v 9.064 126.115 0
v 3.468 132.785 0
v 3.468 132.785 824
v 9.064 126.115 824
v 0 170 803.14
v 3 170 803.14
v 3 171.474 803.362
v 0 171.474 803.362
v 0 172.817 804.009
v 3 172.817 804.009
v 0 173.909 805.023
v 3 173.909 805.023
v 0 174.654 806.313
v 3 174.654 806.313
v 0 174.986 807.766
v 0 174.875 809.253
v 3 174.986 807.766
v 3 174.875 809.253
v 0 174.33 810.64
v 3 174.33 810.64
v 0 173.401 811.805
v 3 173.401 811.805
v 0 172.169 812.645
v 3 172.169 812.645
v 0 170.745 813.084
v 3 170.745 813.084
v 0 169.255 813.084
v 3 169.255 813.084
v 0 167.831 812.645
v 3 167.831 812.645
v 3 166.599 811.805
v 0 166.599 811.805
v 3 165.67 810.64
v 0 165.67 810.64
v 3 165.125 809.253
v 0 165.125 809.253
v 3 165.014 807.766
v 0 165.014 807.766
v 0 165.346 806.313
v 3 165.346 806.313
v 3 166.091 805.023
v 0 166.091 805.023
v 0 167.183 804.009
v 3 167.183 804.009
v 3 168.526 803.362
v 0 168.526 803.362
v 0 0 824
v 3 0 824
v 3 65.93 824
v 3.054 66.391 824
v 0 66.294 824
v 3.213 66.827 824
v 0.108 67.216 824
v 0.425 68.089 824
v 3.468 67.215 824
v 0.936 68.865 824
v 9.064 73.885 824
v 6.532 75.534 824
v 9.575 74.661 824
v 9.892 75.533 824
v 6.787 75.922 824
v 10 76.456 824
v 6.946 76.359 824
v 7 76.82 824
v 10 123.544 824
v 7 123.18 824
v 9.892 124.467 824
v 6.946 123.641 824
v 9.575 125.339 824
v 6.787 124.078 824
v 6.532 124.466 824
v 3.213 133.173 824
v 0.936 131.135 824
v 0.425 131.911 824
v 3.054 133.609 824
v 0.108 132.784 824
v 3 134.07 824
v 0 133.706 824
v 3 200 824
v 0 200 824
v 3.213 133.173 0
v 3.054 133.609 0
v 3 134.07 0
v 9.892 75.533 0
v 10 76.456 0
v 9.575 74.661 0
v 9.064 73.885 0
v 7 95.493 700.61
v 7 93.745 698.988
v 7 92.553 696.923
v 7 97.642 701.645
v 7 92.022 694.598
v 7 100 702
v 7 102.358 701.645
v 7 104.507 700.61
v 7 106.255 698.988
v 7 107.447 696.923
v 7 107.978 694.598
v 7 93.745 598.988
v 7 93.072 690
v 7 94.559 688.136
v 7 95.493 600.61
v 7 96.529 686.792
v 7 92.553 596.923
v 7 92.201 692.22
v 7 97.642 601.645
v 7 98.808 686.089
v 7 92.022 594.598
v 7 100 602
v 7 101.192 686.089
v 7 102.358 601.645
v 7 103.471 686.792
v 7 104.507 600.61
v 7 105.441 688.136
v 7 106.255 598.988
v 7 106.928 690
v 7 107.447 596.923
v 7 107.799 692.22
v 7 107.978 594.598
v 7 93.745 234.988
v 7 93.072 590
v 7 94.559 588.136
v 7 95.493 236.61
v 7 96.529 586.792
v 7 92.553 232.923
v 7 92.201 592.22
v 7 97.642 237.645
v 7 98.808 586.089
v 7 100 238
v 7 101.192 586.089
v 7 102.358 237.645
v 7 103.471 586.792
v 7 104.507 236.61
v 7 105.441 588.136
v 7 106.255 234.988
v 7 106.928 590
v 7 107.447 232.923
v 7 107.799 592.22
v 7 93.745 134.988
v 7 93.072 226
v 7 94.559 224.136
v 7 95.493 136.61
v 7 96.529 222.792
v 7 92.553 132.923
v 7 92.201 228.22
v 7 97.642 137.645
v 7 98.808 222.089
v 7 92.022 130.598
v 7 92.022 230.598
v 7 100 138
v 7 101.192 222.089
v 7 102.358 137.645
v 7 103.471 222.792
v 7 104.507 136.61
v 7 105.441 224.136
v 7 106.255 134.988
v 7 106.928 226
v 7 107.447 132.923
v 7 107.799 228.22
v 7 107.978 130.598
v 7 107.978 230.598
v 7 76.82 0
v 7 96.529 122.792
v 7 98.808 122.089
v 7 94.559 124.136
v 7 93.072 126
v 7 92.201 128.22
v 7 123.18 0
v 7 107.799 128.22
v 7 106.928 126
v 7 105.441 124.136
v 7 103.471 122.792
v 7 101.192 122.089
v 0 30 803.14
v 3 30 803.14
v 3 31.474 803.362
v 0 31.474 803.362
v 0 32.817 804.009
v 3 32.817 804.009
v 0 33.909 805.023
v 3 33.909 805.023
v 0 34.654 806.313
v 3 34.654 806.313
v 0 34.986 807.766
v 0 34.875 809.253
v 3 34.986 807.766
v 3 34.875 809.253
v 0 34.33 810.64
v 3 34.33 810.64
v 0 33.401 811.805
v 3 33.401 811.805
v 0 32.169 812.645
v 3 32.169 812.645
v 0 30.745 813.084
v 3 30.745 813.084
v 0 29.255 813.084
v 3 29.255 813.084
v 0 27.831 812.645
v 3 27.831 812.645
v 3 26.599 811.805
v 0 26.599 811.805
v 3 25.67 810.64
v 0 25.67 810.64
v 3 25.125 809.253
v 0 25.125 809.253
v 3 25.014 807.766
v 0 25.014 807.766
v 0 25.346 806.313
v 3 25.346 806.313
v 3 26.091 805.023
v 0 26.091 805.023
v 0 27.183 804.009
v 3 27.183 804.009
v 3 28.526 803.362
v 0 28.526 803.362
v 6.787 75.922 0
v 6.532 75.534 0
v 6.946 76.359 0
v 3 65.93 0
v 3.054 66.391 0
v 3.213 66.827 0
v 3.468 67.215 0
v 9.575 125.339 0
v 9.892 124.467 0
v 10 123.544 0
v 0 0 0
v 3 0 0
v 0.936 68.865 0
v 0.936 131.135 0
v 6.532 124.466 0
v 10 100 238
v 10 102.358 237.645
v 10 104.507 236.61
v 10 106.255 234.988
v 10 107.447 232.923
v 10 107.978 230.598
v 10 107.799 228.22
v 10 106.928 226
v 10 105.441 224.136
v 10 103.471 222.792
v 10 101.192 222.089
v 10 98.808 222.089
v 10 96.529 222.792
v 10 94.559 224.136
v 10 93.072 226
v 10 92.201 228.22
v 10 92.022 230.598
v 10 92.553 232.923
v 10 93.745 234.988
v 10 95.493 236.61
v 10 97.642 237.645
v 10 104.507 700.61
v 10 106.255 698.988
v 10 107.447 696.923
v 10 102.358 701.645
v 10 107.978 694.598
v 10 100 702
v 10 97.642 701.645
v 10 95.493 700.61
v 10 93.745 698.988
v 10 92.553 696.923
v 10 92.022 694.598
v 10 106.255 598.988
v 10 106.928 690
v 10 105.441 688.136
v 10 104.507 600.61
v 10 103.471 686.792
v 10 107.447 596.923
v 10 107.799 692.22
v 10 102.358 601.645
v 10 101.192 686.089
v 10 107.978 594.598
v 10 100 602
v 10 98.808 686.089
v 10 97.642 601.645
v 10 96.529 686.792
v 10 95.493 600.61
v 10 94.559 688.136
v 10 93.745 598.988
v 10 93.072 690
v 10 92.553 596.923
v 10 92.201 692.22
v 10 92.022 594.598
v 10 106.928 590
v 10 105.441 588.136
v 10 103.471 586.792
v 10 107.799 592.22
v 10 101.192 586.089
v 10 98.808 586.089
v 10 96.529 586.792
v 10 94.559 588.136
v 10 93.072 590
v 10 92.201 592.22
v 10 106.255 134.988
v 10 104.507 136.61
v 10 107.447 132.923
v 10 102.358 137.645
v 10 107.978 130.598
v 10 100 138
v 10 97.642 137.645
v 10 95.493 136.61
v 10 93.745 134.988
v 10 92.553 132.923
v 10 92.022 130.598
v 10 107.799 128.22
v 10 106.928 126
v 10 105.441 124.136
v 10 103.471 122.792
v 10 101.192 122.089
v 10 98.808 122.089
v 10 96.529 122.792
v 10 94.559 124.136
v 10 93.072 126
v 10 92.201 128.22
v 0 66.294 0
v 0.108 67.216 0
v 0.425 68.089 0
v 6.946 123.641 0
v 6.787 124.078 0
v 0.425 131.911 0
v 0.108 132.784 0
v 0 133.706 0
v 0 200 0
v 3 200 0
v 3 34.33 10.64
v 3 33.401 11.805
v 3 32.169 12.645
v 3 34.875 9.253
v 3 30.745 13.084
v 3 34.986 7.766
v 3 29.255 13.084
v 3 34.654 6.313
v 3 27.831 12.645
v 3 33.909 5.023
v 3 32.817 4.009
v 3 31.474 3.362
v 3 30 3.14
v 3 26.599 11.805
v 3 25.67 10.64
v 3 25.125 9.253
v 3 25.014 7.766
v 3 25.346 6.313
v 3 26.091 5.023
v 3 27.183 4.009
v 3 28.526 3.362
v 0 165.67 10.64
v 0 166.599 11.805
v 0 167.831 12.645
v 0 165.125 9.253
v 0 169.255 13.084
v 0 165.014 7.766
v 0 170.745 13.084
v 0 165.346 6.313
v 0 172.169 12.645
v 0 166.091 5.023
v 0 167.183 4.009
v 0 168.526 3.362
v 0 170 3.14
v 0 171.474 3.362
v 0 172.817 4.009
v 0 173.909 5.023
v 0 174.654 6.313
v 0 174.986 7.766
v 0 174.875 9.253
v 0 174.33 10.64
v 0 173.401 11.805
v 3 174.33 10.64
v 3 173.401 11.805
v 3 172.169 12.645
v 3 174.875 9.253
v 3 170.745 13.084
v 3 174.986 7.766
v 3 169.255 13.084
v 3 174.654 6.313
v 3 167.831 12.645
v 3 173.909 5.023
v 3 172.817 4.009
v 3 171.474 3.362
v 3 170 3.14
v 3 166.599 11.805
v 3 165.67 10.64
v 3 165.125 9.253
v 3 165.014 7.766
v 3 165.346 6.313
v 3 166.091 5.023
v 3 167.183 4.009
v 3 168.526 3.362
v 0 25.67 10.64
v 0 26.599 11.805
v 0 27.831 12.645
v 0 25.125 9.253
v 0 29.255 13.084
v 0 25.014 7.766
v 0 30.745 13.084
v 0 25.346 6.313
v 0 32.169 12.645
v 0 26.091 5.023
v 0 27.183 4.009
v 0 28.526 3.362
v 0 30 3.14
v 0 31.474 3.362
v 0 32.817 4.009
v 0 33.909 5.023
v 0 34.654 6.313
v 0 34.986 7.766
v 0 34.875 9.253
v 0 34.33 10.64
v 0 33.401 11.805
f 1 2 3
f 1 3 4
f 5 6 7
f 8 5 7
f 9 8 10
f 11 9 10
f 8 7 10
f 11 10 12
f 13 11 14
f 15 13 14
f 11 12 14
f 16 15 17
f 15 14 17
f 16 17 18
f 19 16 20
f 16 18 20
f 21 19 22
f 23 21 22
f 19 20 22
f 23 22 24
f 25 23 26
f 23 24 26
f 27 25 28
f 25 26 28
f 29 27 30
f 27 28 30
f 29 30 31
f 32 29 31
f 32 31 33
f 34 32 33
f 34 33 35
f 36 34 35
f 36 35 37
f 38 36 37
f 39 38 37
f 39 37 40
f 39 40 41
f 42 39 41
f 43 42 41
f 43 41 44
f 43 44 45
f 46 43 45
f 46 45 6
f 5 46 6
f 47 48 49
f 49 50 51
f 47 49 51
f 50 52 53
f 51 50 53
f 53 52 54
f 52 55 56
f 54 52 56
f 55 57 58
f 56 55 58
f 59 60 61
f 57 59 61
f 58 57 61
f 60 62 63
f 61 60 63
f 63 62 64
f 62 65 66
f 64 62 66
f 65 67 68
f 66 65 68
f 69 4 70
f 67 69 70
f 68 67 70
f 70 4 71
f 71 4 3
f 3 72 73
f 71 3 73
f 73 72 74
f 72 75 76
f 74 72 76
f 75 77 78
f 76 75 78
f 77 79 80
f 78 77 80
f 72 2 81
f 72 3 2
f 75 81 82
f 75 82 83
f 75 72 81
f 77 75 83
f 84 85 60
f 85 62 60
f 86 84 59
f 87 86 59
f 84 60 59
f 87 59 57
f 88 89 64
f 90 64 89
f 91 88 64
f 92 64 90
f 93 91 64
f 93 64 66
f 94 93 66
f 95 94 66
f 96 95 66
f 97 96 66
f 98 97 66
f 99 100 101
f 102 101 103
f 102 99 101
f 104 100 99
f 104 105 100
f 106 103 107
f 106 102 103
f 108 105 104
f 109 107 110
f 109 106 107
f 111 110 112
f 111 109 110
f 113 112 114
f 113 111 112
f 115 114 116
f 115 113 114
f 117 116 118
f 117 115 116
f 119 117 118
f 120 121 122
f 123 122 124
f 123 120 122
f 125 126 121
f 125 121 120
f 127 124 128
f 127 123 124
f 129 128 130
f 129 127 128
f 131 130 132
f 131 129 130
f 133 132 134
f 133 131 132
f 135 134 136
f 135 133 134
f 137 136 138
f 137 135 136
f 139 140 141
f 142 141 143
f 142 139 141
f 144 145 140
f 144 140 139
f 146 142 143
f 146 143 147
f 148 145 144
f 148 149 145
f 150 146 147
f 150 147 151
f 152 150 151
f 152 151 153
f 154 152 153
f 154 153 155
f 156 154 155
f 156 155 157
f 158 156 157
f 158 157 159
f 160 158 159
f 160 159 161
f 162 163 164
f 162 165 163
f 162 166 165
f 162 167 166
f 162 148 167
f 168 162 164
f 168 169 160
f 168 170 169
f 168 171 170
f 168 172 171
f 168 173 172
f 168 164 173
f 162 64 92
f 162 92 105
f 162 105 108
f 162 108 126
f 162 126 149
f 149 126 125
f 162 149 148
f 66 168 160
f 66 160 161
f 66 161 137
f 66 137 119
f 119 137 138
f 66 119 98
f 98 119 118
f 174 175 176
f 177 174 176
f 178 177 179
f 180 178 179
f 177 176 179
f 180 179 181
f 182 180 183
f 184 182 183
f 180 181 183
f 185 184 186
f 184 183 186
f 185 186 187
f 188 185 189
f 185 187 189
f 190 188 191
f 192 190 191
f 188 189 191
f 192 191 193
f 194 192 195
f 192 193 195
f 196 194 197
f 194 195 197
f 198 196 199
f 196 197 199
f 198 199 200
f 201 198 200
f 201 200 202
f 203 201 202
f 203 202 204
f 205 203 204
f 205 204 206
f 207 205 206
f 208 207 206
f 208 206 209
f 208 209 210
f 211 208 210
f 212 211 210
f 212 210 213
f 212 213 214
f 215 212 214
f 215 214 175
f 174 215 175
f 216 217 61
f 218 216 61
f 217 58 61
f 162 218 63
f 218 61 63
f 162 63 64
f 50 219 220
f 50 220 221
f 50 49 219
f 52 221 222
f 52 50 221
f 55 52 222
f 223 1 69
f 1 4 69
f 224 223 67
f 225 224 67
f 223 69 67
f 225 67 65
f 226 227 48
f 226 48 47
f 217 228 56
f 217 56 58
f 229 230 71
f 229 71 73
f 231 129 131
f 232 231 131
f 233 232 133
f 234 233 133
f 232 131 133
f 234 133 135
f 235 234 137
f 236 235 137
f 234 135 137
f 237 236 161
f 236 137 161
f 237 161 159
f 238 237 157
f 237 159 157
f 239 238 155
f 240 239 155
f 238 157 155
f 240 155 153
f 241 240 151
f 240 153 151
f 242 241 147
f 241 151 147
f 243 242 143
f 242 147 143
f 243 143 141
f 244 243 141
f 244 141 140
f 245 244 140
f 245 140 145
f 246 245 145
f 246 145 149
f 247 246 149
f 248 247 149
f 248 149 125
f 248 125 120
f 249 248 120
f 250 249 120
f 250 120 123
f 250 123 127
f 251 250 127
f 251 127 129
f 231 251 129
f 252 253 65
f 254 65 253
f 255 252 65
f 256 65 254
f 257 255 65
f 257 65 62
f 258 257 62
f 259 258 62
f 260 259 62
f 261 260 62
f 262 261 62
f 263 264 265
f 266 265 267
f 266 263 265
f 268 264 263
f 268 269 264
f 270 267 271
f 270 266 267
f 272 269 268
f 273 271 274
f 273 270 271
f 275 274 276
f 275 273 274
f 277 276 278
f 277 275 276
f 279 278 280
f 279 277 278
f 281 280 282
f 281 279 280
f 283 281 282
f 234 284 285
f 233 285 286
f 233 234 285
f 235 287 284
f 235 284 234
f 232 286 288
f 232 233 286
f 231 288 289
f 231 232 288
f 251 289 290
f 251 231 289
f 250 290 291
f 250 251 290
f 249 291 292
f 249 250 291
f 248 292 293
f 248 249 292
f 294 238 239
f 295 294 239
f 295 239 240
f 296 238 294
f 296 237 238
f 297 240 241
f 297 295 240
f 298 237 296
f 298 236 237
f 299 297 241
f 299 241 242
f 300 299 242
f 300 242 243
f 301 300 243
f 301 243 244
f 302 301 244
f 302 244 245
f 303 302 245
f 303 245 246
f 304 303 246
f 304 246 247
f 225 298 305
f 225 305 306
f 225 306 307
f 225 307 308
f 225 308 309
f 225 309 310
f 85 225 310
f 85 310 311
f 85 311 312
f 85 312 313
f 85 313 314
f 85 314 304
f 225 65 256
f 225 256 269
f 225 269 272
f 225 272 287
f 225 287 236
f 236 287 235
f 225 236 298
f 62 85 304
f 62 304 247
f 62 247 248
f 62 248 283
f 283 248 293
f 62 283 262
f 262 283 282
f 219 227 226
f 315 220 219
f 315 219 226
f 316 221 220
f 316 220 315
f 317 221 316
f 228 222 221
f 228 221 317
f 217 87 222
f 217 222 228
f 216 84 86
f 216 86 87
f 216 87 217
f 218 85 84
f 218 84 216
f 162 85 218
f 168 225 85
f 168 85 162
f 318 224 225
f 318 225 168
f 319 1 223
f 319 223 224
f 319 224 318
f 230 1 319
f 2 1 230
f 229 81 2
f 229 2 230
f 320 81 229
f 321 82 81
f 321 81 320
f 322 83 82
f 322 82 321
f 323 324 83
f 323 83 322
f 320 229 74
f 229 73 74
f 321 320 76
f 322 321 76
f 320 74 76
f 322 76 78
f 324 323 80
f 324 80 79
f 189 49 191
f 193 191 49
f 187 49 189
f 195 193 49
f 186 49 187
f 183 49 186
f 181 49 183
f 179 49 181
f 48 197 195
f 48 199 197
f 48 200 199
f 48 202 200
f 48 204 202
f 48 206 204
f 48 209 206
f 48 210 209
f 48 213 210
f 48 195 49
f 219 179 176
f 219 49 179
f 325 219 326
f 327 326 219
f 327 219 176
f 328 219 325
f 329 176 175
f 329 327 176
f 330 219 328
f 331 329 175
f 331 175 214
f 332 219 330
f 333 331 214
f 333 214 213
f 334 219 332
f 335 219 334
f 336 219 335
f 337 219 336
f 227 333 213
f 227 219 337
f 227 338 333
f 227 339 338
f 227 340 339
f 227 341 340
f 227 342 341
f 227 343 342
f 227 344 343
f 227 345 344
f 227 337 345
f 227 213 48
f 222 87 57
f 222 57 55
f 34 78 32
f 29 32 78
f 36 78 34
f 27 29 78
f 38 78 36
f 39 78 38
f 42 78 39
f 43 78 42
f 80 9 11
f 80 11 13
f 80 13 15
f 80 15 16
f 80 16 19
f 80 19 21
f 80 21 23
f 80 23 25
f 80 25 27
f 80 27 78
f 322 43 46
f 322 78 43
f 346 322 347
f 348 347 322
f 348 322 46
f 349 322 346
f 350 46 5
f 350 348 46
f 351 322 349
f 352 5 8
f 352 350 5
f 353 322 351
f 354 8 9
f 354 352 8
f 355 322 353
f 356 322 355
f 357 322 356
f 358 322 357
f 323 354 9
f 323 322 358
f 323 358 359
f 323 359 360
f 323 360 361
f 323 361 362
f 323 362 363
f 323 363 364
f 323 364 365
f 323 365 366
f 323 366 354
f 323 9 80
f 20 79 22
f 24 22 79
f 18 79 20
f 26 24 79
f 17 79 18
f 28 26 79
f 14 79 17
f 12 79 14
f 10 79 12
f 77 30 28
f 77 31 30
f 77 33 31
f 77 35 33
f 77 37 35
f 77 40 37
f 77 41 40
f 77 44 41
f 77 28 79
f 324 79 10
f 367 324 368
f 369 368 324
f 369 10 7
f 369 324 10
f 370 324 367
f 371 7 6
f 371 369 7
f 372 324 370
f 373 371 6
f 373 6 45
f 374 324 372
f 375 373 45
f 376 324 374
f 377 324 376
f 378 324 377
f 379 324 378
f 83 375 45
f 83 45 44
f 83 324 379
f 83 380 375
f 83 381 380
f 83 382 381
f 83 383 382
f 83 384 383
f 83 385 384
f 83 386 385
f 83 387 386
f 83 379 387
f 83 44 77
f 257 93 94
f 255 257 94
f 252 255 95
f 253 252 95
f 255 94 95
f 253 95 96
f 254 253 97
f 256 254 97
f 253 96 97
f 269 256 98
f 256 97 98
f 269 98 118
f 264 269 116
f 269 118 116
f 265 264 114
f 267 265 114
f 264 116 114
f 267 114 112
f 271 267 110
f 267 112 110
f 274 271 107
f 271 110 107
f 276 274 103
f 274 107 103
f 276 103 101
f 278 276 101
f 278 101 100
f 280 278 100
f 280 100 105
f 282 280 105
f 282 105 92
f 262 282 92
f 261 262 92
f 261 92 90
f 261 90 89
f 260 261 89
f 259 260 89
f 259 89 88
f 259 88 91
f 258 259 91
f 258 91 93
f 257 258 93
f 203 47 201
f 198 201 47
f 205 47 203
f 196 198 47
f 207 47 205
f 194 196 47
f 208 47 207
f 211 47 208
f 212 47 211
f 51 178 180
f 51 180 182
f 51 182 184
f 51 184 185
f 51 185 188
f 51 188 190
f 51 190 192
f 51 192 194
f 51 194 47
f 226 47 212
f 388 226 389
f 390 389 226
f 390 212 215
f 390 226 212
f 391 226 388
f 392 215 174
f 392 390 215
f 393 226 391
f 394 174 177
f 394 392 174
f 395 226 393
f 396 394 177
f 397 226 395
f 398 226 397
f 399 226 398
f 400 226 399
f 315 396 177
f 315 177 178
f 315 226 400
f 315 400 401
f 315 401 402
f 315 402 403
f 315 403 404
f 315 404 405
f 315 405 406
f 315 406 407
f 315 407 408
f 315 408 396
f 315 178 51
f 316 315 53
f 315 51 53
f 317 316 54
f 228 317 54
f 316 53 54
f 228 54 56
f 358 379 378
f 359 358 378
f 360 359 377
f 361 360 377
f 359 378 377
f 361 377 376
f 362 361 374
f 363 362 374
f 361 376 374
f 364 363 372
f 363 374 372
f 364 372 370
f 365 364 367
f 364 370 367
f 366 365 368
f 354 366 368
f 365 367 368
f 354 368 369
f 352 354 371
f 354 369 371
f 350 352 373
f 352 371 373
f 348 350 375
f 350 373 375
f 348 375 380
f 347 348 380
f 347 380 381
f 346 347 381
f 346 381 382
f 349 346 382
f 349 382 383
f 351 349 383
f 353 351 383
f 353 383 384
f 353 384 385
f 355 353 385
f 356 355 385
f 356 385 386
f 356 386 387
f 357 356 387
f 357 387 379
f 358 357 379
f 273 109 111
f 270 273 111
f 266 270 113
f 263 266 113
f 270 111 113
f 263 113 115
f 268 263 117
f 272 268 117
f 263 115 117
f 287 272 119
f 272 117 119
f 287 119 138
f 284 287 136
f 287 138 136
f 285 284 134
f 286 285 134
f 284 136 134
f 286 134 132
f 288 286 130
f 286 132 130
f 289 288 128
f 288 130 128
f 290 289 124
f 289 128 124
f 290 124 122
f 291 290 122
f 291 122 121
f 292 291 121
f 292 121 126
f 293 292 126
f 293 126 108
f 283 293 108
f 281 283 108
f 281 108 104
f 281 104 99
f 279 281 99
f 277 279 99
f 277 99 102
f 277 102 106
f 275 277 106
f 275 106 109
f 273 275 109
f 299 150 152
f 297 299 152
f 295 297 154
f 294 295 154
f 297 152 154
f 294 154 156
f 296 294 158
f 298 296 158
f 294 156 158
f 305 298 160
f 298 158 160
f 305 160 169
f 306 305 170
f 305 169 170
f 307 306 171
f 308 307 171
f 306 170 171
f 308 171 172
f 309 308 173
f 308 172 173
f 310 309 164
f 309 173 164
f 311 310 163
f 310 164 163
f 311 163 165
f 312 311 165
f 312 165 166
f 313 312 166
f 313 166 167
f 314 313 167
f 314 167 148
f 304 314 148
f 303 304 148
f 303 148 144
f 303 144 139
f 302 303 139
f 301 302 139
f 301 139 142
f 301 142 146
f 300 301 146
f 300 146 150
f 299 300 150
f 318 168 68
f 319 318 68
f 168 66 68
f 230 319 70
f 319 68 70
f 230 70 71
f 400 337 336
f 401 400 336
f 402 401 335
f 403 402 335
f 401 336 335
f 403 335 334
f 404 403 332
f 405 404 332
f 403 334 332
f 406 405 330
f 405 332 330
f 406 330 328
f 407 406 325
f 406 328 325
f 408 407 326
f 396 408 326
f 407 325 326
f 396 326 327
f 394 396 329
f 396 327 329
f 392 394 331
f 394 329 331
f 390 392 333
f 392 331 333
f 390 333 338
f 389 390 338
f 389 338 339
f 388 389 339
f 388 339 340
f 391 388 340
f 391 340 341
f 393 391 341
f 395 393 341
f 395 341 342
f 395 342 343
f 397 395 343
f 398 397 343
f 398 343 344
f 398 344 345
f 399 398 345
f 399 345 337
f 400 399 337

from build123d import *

# Parameters (mm, degrees)
EXTRUDE_1_DEPTH             = 824
FILLET_1_R                  = 4
FILLET_2_R                  = 2
HOLE_WIZARD_16_0_16_1_D     = 16
HOLE_WIZARD_16_0_16_1_DEPTH = 24.5
HOLE_WIZARD_16_0_16_1_TIP   = 4.806884952
HOLE_WIZARD_10_0_10_1_D     = 10


with BuildPart() as part:
    # 草图1 → 凸台-拉伸1 (new body)
    with BuildSketch(Plane.XY):
        Polygon((0, 0), (0, 67.749635555), (7, 76.091910703), (7, 123.908089297), (0, 132.250364445), (0, 200), (3, 200), (3, 133.342275148), (10, 125), (10, 75), (3, 66.657724852), (3, 0), align=None)
    extrude(amount=EXTRUDE_1_DEPTH)

    # 圆角1
    fillet_1_edges = [part.edges().sort_by_distance(p)[0] for p in [
        (0, 67.749635555, 412),
        (0, 132.250364445, 412),
        (10, 125, 412),
        (10, 75, 412),
    ]]
    fillet(fillet_1_edges, radius=FILLET_1_R)

    # 圆角2
    fillet_2_edges = [part.edges().sort_by_distance(p)[0] for p in [
        (7, 76.091910703, 412),
        (7, 123.908089297, 412),
        (3, 133.342275148, 412),
        (3, 66.657724852, 412),
    ]]
    fillet(fillet_2_edges, radius=FILLET_2_R)

    # Ø16.0 (16) 直径孔1
    with Locations(Plane(origin=(10, 0, 0), x_dir=(0, 0, -1), z_dir=(1, 0, 0))):
        with Locations((-694, 100), (-130, 100), (-594, 100), (-230, 100)):
            Hole(HOLE_WIZARD_16_0_16_1_D / 2, depth=HOLE_WIZARD_16_0_16_1_DEPTH)
            with Locations((0, 0, -(HOLE_WIZARD_16_0_16_1_DEPTH + HOLE_WIZARD_16_0_16_1_TIP / 2))):  # 118° drill point
                Cone(0, HOLE_WIZARD_16_0_16_1_D / 2, HOLE_WIZARD_16_0_16_1_TIP, mode=Mode.SUBTRACT)

    # Ø10.0 (10) 直径孔1 (through all)
    with Locations(Plane.ZY):
        with Locations((8.14, 170), (8.14, 30), (808.14, 170), (808.14, 30)):
            Hole(HOLE_WIZARD_10_0_10_1_D / 2)


solid = part.part
